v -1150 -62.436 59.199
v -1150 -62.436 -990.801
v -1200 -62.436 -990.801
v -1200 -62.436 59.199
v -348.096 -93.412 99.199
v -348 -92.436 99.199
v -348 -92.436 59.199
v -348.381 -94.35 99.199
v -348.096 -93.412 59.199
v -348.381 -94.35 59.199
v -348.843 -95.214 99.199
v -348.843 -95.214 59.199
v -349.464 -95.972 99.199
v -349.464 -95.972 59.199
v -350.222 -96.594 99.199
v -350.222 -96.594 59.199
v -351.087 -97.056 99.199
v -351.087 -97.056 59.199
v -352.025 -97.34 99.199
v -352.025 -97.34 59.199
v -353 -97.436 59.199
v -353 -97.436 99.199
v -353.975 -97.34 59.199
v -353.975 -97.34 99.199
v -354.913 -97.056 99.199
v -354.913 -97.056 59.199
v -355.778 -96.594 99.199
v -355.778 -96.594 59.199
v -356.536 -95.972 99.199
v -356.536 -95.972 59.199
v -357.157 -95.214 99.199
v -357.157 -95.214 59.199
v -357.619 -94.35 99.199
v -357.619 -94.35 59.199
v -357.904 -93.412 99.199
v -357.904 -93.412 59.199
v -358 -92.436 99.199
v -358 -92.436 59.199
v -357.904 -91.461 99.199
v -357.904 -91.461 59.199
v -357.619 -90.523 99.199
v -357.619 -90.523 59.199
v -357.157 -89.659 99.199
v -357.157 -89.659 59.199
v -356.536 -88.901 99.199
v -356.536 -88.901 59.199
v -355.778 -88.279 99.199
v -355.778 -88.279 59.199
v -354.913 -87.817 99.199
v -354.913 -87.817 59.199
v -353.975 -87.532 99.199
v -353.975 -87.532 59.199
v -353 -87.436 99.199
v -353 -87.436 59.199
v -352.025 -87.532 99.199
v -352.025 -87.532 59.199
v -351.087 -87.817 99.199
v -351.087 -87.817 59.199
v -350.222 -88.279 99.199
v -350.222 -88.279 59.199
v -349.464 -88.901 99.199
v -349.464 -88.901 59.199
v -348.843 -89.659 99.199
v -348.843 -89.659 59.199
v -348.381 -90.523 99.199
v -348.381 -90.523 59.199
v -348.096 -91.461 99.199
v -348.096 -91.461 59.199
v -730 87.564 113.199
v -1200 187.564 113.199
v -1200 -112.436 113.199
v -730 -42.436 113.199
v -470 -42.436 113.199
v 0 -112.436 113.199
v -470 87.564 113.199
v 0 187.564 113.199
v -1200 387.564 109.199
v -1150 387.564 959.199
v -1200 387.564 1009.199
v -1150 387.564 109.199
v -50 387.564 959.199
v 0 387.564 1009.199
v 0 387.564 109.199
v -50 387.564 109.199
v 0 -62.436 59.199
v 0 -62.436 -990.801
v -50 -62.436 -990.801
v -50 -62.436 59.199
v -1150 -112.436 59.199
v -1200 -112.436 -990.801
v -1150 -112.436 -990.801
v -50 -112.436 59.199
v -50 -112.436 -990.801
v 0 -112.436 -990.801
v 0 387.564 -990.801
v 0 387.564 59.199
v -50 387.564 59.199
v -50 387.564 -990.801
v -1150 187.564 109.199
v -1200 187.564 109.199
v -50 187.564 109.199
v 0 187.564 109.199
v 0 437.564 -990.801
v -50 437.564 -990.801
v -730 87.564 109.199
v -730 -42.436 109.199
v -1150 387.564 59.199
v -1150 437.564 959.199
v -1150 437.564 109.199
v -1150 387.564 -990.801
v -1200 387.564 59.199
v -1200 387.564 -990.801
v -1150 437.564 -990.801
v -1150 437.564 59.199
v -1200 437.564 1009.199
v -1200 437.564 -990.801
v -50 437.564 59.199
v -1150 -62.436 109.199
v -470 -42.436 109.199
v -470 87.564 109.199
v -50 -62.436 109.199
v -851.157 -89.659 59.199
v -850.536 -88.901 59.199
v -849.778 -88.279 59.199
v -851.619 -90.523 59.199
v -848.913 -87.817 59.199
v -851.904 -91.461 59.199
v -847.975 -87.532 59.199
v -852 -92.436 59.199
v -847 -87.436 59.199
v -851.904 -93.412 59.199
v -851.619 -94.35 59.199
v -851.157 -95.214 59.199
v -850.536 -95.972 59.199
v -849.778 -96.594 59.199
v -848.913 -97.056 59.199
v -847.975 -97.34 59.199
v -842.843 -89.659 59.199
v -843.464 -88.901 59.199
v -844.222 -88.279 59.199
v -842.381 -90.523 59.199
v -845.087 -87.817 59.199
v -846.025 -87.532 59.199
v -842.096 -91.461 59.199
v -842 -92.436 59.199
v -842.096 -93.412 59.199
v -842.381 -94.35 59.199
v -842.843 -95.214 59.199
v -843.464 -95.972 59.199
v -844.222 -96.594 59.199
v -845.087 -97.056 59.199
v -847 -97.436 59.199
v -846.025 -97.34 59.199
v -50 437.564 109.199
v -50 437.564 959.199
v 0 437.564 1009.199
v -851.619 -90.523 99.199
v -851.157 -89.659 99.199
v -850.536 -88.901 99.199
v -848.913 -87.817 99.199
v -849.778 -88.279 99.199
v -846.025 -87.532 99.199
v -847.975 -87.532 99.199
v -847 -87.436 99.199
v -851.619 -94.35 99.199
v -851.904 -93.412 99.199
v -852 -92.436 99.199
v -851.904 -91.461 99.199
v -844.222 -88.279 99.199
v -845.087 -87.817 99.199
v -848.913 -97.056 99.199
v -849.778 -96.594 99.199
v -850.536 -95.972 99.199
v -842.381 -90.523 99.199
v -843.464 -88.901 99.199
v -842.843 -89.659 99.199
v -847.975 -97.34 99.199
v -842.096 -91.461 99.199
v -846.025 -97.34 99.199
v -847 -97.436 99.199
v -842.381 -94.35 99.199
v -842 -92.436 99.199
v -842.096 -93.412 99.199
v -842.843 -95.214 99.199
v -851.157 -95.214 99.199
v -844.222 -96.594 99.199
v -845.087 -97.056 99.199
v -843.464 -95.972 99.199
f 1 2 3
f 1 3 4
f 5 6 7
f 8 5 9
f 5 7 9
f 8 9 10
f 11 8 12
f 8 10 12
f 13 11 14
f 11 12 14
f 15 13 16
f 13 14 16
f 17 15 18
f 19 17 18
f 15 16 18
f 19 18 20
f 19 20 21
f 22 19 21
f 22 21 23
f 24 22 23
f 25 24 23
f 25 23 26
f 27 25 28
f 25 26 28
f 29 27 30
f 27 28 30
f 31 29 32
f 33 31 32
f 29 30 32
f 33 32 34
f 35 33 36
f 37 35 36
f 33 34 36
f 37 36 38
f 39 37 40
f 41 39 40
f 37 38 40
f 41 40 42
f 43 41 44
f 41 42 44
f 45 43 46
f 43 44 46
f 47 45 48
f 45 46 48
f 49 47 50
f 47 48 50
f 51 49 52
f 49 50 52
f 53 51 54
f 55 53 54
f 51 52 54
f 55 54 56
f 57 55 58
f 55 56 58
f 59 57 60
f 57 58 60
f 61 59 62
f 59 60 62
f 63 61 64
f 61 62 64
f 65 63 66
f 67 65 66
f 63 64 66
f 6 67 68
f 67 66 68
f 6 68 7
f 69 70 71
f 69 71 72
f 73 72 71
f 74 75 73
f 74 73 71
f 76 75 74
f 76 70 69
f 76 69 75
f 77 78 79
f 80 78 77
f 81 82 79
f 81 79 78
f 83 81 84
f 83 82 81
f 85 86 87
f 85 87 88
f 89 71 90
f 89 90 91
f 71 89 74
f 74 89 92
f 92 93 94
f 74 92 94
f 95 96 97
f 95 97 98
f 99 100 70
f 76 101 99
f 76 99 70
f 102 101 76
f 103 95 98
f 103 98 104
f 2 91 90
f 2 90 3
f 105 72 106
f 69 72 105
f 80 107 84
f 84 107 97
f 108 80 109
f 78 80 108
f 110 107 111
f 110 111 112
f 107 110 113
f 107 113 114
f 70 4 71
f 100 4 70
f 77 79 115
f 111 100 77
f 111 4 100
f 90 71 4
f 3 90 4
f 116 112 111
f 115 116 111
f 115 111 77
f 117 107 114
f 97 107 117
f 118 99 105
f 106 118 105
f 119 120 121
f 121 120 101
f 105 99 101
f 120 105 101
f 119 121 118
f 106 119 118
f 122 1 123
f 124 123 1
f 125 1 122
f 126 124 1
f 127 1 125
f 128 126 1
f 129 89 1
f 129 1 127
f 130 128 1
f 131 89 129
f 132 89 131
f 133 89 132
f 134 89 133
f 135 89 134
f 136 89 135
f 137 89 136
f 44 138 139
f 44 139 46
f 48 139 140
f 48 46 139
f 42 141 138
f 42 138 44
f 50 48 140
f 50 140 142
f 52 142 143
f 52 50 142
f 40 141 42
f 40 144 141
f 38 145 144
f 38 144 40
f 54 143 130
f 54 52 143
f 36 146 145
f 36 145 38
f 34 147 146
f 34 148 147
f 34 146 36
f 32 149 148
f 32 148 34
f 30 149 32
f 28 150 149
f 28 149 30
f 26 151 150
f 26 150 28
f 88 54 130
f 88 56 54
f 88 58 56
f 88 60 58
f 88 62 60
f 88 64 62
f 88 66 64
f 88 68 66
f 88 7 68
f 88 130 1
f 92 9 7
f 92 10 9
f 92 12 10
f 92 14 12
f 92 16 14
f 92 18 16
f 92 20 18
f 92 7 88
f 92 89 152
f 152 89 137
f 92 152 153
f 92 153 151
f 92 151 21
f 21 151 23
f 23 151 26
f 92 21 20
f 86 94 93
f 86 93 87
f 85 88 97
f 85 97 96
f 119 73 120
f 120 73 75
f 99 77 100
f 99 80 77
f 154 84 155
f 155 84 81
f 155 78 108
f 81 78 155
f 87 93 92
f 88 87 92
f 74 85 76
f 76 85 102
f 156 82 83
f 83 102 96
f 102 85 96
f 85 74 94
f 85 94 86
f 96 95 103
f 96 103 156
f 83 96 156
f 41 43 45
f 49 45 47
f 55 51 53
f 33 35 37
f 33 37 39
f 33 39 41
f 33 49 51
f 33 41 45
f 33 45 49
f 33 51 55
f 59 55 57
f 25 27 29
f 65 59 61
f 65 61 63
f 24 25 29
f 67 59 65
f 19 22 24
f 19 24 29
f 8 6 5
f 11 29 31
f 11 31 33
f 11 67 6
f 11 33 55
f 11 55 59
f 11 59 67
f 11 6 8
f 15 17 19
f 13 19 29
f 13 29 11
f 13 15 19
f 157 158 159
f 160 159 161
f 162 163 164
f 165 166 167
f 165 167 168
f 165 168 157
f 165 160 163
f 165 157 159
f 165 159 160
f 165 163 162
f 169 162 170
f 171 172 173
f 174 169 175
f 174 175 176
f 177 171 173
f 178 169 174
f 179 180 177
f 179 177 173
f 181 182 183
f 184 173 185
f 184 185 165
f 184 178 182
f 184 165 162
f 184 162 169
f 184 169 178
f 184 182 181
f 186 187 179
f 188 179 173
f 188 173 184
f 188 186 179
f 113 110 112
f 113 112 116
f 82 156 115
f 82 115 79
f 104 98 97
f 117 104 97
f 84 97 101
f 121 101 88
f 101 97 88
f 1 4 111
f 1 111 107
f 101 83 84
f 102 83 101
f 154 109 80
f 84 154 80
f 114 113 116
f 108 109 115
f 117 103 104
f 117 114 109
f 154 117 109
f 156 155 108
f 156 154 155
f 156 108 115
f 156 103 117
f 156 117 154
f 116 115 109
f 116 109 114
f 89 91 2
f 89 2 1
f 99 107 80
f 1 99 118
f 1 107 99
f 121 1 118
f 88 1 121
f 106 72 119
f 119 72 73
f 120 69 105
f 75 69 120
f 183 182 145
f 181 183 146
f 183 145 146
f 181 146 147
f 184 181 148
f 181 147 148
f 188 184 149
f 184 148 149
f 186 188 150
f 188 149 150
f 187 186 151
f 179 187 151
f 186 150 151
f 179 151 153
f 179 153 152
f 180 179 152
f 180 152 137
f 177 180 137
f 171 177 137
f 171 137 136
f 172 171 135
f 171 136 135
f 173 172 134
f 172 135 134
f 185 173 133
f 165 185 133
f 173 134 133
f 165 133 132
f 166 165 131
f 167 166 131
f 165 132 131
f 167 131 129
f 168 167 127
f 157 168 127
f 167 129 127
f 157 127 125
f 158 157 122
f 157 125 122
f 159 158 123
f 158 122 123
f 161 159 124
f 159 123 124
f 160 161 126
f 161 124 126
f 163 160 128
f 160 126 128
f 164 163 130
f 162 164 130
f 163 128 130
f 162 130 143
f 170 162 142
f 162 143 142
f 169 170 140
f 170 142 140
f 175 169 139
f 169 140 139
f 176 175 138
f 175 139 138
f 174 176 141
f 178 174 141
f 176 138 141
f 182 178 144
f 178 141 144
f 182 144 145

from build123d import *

# Parameters (mm, degrees)
F1_DEPTH  = 1200
F2_W      = 1100
F2_H      = 1050
F3_DEPTH  = 550.001
F4_W      = 1100
F4_H      = 850
F5_DEPTH  = 50.001
F6_R      = 5
F7_DEPTH  = 40
F8_W      = 1100
F8_H      = 450
F9_DEPTH  = 950.001
F10_W     = 1200
F10_H     = 300
F11_DEPTH = 4
F12_W     = 260
F12_H     = 130
F13_DEPTH = 4


with BuildPart() as f1:
    # F0 (on Right) → F1 (new body)
    with BuildSketch(Plane.YZ):
        Polygon((-112.436364, 109.19924), (-112.436364, -990.80076), (-62.436364, -990.80076), (-62.436364, 59.19924), (387.563636, 59.19924), (387.563636, -990.80076), (437.563636, -990.80076), (437.563636, 1009.19924), (387.563636, 1009.19924), (387.563636, 109.19924), align=None)
    extrude(amount=-F1_DEPTH)

    # F2 (on face) → F3 (cut, through all)
    with BuildSketch(Plane.XZ.offset(112.436364)):
        with Locations((-600, -465.80076)):
            Rectangle(F2_W, F2_H)
    extrude(amount=-F3_DEPTH, mode=Mode.SUBTRACT)

    # F4 (on face) → F5 (cut, through all)
    with BuildSketch(Plane.XZ.offset(-387.563636)):
        with Locations((-600, 534.19924)):
            Rectangle(F4_W, F4_H)
    extrude(amount=-F5_DEPTH, mode=Mode.SUBTRACT)

    # F6 (on face) → F7 (cut)
    with BuildSketch(Plane(origin=(0, 0, 59.19924), x_dir=(1, 0, 0), z_dir=(0, 0, -1))):
        with Locations((-847, 92.436364)):
            Circle(F6_R)
        with Locations((-353, 92.436364)):
            Circle(F6_R)
    extrude(amount=-F7_DEPTH, mode=Mode.SUBTRACT)

    # F8 (on face) → F9 (cut, through all)
    with BuildSketch(Plane(origin=(0, 0, 59.19924), x_dir=(1, 0, 0), z_dir=(0, 0, -1))):
        with Locations((-600, -162.563636)):
            Rectangle(F8_W, F8_H)
    extrude(amount=-F9_DEPTH, mode=Mode.SUBTRACT)

    # F10 (on face) → F11 (join)
    with BuildSketch(Plane.XY.offset(109.19924)):
        with Locations((-600, 37.563636)):
            Rectangle(F10_W, F10_H)
    extrude(amount=F11_DEPTH)

    # F12 (on face) → F13 (cut)
    with BuildSketch(Plane.XY.offset(113.19924)):
        with Locations((-600, 22.563636)):
            Rectangle(F12_W, F12_H)
    extrude(amount=-F13_DEPTH, mode=Mode.SUBTRACT)


solid = f1.part
